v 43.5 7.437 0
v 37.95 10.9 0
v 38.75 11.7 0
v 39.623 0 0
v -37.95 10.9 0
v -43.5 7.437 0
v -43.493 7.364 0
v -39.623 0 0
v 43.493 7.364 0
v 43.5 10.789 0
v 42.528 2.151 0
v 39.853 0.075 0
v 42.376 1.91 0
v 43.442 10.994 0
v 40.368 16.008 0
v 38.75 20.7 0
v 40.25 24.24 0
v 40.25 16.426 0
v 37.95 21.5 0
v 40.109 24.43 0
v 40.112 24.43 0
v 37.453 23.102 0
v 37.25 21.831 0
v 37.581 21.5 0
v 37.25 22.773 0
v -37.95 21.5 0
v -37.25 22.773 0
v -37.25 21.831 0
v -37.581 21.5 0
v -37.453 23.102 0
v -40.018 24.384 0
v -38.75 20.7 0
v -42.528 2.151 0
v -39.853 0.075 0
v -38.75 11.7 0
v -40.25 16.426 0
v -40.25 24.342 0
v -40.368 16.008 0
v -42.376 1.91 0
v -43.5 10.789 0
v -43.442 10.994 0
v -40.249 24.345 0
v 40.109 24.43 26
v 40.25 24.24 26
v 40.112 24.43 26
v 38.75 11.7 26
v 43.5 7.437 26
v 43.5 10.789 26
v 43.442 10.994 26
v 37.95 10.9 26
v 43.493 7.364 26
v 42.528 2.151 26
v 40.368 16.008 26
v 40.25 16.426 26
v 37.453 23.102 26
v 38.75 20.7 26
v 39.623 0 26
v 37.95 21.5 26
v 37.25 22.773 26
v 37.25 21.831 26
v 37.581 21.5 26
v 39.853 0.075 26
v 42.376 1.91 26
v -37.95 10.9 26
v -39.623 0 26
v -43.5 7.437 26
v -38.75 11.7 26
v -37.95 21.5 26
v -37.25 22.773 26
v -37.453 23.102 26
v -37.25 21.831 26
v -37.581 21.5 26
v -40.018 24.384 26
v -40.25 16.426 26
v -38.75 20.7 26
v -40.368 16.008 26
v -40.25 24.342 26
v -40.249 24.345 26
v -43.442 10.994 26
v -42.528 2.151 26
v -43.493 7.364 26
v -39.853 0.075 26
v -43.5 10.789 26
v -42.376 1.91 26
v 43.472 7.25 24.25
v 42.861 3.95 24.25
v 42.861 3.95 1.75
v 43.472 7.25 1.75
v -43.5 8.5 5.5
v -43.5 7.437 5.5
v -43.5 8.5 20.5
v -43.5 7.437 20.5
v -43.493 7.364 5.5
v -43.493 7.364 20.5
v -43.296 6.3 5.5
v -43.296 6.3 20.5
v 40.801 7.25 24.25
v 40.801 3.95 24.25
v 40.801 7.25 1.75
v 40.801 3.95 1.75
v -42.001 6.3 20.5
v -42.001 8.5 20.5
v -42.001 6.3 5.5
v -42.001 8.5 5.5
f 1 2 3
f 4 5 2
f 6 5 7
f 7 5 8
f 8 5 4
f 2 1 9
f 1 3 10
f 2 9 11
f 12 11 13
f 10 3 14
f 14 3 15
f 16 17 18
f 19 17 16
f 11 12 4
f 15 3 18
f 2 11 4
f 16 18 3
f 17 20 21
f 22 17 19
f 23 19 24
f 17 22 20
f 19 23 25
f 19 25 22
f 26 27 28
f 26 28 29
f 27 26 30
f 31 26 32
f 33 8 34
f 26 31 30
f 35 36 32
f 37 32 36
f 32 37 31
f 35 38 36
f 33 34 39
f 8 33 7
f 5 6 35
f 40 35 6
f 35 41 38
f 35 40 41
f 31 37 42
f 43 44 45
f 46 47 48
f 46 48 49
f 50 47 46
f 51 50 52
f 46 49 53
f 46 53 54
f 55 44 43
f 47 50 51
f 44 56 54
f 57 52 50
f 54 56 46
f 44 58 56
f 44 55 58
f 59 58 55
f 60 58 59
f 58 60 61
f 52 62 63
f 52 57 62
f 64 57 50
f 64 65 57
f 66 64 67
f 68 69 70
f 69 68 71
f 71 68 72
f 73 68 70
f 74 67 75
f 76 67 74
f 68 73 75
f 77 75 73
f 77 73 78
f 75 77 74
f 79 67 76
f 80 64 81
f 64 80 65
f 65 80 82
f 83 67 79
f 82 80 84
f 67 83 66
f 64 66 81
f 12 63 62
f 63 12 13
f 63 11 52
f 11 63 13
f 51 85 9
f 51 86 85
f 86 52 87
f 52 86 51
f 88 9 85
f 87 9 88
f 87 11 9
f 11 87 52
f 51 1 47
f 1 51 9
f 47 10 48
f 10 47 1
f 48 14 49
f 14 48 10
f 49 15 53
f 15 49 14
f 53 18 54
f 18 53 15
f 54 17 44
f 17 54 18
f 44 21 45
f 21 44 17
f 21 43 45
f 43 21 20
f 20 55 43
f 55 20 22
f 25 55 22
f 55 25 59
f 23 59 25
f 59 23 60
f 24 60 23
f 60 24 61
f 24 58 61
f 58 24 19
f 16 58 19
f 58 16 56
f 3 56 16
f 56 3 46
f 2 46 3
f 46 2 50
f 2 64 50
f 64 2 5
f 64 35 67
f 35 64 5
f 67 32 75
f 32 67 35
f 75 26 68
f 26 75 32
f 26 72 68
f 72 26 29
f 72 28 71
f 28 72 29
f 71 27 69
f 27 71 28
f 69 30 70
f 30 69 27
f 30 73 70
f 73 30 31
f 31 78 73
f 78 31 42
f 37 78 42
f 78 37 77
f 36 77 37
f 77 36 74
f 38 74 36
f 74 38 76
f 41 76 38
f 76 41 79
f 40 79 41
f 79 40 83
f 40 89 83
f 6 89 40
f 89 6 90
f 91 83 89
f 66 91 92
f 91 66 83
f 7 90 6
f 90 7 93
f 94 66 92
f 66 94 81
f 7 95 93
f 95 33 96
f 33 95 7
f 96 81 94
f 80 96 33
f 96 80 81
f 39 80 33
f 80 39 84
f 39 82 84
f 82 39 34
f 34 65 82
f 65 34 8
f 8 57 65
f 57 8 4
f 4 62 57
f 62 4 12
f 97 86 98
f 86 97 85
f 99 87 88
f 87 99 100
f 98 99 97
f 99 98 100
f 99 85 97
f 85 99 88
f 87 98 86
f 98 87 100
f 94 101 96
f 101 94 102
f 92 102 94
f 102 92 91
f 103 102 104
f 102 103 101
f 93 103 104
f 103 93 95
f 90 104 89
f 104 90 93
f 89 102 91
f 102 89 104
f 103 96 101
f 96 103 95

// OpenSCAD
b1 = 79.5;
b1a = 85.0;
b2 = 87;
h1a = 2;
rightNubFromBase = 5.6;
rightNubSlitThickness = 3.3;
rightNubSlitLength = 22.5;;
rightNubSlitDepth = 2.7;
leftNubFromBase = 7.4;
leftNubSlitThickness = 2.2;
leftNubSlitLength = 15;
leftNubSlitDepth = 1.5;
fromNubsToPhone = 3.5;
phoneWidth = 77.5;
snapHeight = 10.6;
snapInset = 1.5;
snapThickness = 1.5;
holderWidth = 26;
rounding = 0.8;

module end_of_parameters_dummy() {}

//use <paths.scad>;
function sumTo(v,n) = n<=0 ? 0 : v[n-1]+sumTo(v,n-1);
function sum(v) = sumTo(v,len(v));
function interpolationData(v) = let(
    n=len(v)-1,
    d=[for (i=[0:n-1]) norm(v[i]-v[i+1])],
    sumD=[for (i=[0:n]) sumTo(d,i)],
    totalD=sumD[n])
        [d,sumD,v,totalD];
function totalLength(interp) = interp[3];
function interpolatePoints(a,b,t) = (1-t)*a+(t)*b;
function findSegmentByDistance(sumD,distance) = let(
    found = [for(i=[0:len(sumD)-1]) if(sumD[i]<=distance && distance<sumD[i+1]) i])
        len(found)>0 ? found[0] : -1;
function interpolateByDistance(interp,distance) = let(
    n=len(interp[1])-1,
    d=interp[0],
    sumD=interp[1],
    v=interp[2],
    totalD=interp[3],
    i=findSegmentByDistance(sumD,distance))
        i<0 ? (distance<totalD/2 ? v[0] : v[n]) :
            interpolatePoints(v[i],v[i+1],(distance-sumD[i])/d[i]);
function get2DNormalBetweenPoints(a,b) = let(
    v = (b-a)/norm(b-a))
        [v[1],-v[0]];
function getTangentByDistance(interp,distance) = let(
    n=len(interp[1])-1,
    d=interp[0],
    sumD=interp[1],
    v=interp[2],
    totalD=interp[3],
    i0=findSegmentByDistance(sumD,distance),
    i = i0 < 0 ? (distance<totalD/2 ? 0 : n-1) : i0)
        (v[i+1]-v[i])/norm(v[i+1]-v[i]);

function interpolateByParameter(interp,t) = interpolateByDistance(interp,t*totalLength(interp));
function singleInterpolateByDistance(v,distance) = interpolateByDistance(interpolationData(v),distance);
function singleInterpolateByParameter(v,t) = interpolateByParameter(interpolationData(v),t);
function measurePath(v) = totalLength(interpolationData(v));

function findCoordinateIntersection2(a,b,index,value) =
    a[index] == value ? a :
        b[index] == value ? b :
            let( t=(value-a[index]) / (b[index]-a[index]))
                (1-t)*a+t*b;

function findCoordinateIntersections(path,index,value) =
    [for (i=[0:len(path)-2]) if ((path[i][index]-value)*(path[i+1][index]-value) <= 0) findCoordinateIntersection2(path[i],path[i+1],index,value)];

function mirrorMatrix(normalVector) = let(v = normalVector/norm(normalVector)) len(v)<3 ? [[1-2*v[0]*v[0],-2*v[0]*v[1]],[-2*v[0]*v[1],1-2*v[1]*v[1]]] : [[1-2*v[0]*v[0],-2*v[0]*v[1],-2*v[0]*v[2]],[-2*v[0]*v[1],1-2*v[1]*v[1],-2*v[1]*v[2]],[-2*v[0]*v[2],-2*v[1]*v[2],1-2*v[2]*v[2]]];

function trimArray(a, n) = [for (i=[0:n-1]) a[i]];

function transformPoint(matrix,a) =
    let(n=len(a))
        len(matrix[0])==n+1 ?
            trimArray(matrix * concat(a,[1]), n)
            : matrix * a;

function transformPath(matrix,path) =
    [for (a=path) transformPoint(matrix,a)];

function reverseArray(array) = let(n=len(array)) [for (i=[0:n-1]) array[n-1-i]];

function stitchPaths(a,b) = let(na=len(a)) [for (i=[0:na+len(b)-2]) i<na? a[i] : b[i-na+1]-b[0]+a[na-1]];

//interp = interpolationData([[1,2],[2,3],[1,2]]);
//echo(singleInterpolateByParameter([[1,1],[2,2],[3,1]],0.75));
//echo(measurePath([[1,2],[2,3],[1,2]]));



module dummy() {}

nudge = 0.001;

rightPath =
  [ [b1/2,0],
    [b1a/2,h1a],
    [b2/2,max(leftNubFromBase,rightNubFromBase)],
    [b2/2,max(leftNubFromBase,rightNubFromBase)+fromNubsToPhone],
    [phoneWidth/2+snapThickness,max(leftNubFromBase,rightNubFromBase)+fromNubsToPhone+snapHeight*0.5],
    [phoneWidth/2+snapThickness,max(leftNubFromBase,rightNubFromBase)+fromNubsToPhone+snapHeight+snapThickness+1.5],
    [phoneWidth/2-snapInset,max(leftNubFromBase,rightNubFromBase)+fromNubsToPhone+snapHeight+snapThickness],
    [phoneWidth/2-snapInset,max(leftNubFromBase,rightNubFromBase)+fromNubsToPhone+snapHeight],
    [phoneWidth/2,max(leftNubFromBase,rightNubFromBase)+fromNubsToPhone+snapHeight],
    [phoneWidth/2,max(leftNubFromBase,rightNubFromBase)+fromNubsToPhone],
    [0, max(leftNubFromBase,rightNubFromBase)+fromNubsToPhone]];


path = stitchPaths(rightPath,reverseArray(transformPath(mirrorMatrix([1,0]),rightPath)));

module mainHolder() {
    linear_extrude(height=holderWidth)
offset(r=-rounding) offset(r=rounding) polygon(points=path);
}

module slit(nubFromBase,nubSlitThickness,nubSlitLength,nubSlitDepth) {
    translate([b2/2+nudge-nubSlitDepth,nubFromBase-nubSlitThickness/2,holderWidth/2-nubSlitLength/2])
    cube([nubSlitDepth+nudge,nubSlitThickness,nubSlitLength]);
}

render(convexity=2)
difference() {
    mainHolder();
    slit(rightNubFromBase,rightNubSlitThickness,rightNubSlitLength,rightNubSlitDepth);
    mirror([1,0,0]) slit(leftNubFromBase,leftNubSlitThickness,leftNubSlitLength,leftNubSlitDepth);
}
